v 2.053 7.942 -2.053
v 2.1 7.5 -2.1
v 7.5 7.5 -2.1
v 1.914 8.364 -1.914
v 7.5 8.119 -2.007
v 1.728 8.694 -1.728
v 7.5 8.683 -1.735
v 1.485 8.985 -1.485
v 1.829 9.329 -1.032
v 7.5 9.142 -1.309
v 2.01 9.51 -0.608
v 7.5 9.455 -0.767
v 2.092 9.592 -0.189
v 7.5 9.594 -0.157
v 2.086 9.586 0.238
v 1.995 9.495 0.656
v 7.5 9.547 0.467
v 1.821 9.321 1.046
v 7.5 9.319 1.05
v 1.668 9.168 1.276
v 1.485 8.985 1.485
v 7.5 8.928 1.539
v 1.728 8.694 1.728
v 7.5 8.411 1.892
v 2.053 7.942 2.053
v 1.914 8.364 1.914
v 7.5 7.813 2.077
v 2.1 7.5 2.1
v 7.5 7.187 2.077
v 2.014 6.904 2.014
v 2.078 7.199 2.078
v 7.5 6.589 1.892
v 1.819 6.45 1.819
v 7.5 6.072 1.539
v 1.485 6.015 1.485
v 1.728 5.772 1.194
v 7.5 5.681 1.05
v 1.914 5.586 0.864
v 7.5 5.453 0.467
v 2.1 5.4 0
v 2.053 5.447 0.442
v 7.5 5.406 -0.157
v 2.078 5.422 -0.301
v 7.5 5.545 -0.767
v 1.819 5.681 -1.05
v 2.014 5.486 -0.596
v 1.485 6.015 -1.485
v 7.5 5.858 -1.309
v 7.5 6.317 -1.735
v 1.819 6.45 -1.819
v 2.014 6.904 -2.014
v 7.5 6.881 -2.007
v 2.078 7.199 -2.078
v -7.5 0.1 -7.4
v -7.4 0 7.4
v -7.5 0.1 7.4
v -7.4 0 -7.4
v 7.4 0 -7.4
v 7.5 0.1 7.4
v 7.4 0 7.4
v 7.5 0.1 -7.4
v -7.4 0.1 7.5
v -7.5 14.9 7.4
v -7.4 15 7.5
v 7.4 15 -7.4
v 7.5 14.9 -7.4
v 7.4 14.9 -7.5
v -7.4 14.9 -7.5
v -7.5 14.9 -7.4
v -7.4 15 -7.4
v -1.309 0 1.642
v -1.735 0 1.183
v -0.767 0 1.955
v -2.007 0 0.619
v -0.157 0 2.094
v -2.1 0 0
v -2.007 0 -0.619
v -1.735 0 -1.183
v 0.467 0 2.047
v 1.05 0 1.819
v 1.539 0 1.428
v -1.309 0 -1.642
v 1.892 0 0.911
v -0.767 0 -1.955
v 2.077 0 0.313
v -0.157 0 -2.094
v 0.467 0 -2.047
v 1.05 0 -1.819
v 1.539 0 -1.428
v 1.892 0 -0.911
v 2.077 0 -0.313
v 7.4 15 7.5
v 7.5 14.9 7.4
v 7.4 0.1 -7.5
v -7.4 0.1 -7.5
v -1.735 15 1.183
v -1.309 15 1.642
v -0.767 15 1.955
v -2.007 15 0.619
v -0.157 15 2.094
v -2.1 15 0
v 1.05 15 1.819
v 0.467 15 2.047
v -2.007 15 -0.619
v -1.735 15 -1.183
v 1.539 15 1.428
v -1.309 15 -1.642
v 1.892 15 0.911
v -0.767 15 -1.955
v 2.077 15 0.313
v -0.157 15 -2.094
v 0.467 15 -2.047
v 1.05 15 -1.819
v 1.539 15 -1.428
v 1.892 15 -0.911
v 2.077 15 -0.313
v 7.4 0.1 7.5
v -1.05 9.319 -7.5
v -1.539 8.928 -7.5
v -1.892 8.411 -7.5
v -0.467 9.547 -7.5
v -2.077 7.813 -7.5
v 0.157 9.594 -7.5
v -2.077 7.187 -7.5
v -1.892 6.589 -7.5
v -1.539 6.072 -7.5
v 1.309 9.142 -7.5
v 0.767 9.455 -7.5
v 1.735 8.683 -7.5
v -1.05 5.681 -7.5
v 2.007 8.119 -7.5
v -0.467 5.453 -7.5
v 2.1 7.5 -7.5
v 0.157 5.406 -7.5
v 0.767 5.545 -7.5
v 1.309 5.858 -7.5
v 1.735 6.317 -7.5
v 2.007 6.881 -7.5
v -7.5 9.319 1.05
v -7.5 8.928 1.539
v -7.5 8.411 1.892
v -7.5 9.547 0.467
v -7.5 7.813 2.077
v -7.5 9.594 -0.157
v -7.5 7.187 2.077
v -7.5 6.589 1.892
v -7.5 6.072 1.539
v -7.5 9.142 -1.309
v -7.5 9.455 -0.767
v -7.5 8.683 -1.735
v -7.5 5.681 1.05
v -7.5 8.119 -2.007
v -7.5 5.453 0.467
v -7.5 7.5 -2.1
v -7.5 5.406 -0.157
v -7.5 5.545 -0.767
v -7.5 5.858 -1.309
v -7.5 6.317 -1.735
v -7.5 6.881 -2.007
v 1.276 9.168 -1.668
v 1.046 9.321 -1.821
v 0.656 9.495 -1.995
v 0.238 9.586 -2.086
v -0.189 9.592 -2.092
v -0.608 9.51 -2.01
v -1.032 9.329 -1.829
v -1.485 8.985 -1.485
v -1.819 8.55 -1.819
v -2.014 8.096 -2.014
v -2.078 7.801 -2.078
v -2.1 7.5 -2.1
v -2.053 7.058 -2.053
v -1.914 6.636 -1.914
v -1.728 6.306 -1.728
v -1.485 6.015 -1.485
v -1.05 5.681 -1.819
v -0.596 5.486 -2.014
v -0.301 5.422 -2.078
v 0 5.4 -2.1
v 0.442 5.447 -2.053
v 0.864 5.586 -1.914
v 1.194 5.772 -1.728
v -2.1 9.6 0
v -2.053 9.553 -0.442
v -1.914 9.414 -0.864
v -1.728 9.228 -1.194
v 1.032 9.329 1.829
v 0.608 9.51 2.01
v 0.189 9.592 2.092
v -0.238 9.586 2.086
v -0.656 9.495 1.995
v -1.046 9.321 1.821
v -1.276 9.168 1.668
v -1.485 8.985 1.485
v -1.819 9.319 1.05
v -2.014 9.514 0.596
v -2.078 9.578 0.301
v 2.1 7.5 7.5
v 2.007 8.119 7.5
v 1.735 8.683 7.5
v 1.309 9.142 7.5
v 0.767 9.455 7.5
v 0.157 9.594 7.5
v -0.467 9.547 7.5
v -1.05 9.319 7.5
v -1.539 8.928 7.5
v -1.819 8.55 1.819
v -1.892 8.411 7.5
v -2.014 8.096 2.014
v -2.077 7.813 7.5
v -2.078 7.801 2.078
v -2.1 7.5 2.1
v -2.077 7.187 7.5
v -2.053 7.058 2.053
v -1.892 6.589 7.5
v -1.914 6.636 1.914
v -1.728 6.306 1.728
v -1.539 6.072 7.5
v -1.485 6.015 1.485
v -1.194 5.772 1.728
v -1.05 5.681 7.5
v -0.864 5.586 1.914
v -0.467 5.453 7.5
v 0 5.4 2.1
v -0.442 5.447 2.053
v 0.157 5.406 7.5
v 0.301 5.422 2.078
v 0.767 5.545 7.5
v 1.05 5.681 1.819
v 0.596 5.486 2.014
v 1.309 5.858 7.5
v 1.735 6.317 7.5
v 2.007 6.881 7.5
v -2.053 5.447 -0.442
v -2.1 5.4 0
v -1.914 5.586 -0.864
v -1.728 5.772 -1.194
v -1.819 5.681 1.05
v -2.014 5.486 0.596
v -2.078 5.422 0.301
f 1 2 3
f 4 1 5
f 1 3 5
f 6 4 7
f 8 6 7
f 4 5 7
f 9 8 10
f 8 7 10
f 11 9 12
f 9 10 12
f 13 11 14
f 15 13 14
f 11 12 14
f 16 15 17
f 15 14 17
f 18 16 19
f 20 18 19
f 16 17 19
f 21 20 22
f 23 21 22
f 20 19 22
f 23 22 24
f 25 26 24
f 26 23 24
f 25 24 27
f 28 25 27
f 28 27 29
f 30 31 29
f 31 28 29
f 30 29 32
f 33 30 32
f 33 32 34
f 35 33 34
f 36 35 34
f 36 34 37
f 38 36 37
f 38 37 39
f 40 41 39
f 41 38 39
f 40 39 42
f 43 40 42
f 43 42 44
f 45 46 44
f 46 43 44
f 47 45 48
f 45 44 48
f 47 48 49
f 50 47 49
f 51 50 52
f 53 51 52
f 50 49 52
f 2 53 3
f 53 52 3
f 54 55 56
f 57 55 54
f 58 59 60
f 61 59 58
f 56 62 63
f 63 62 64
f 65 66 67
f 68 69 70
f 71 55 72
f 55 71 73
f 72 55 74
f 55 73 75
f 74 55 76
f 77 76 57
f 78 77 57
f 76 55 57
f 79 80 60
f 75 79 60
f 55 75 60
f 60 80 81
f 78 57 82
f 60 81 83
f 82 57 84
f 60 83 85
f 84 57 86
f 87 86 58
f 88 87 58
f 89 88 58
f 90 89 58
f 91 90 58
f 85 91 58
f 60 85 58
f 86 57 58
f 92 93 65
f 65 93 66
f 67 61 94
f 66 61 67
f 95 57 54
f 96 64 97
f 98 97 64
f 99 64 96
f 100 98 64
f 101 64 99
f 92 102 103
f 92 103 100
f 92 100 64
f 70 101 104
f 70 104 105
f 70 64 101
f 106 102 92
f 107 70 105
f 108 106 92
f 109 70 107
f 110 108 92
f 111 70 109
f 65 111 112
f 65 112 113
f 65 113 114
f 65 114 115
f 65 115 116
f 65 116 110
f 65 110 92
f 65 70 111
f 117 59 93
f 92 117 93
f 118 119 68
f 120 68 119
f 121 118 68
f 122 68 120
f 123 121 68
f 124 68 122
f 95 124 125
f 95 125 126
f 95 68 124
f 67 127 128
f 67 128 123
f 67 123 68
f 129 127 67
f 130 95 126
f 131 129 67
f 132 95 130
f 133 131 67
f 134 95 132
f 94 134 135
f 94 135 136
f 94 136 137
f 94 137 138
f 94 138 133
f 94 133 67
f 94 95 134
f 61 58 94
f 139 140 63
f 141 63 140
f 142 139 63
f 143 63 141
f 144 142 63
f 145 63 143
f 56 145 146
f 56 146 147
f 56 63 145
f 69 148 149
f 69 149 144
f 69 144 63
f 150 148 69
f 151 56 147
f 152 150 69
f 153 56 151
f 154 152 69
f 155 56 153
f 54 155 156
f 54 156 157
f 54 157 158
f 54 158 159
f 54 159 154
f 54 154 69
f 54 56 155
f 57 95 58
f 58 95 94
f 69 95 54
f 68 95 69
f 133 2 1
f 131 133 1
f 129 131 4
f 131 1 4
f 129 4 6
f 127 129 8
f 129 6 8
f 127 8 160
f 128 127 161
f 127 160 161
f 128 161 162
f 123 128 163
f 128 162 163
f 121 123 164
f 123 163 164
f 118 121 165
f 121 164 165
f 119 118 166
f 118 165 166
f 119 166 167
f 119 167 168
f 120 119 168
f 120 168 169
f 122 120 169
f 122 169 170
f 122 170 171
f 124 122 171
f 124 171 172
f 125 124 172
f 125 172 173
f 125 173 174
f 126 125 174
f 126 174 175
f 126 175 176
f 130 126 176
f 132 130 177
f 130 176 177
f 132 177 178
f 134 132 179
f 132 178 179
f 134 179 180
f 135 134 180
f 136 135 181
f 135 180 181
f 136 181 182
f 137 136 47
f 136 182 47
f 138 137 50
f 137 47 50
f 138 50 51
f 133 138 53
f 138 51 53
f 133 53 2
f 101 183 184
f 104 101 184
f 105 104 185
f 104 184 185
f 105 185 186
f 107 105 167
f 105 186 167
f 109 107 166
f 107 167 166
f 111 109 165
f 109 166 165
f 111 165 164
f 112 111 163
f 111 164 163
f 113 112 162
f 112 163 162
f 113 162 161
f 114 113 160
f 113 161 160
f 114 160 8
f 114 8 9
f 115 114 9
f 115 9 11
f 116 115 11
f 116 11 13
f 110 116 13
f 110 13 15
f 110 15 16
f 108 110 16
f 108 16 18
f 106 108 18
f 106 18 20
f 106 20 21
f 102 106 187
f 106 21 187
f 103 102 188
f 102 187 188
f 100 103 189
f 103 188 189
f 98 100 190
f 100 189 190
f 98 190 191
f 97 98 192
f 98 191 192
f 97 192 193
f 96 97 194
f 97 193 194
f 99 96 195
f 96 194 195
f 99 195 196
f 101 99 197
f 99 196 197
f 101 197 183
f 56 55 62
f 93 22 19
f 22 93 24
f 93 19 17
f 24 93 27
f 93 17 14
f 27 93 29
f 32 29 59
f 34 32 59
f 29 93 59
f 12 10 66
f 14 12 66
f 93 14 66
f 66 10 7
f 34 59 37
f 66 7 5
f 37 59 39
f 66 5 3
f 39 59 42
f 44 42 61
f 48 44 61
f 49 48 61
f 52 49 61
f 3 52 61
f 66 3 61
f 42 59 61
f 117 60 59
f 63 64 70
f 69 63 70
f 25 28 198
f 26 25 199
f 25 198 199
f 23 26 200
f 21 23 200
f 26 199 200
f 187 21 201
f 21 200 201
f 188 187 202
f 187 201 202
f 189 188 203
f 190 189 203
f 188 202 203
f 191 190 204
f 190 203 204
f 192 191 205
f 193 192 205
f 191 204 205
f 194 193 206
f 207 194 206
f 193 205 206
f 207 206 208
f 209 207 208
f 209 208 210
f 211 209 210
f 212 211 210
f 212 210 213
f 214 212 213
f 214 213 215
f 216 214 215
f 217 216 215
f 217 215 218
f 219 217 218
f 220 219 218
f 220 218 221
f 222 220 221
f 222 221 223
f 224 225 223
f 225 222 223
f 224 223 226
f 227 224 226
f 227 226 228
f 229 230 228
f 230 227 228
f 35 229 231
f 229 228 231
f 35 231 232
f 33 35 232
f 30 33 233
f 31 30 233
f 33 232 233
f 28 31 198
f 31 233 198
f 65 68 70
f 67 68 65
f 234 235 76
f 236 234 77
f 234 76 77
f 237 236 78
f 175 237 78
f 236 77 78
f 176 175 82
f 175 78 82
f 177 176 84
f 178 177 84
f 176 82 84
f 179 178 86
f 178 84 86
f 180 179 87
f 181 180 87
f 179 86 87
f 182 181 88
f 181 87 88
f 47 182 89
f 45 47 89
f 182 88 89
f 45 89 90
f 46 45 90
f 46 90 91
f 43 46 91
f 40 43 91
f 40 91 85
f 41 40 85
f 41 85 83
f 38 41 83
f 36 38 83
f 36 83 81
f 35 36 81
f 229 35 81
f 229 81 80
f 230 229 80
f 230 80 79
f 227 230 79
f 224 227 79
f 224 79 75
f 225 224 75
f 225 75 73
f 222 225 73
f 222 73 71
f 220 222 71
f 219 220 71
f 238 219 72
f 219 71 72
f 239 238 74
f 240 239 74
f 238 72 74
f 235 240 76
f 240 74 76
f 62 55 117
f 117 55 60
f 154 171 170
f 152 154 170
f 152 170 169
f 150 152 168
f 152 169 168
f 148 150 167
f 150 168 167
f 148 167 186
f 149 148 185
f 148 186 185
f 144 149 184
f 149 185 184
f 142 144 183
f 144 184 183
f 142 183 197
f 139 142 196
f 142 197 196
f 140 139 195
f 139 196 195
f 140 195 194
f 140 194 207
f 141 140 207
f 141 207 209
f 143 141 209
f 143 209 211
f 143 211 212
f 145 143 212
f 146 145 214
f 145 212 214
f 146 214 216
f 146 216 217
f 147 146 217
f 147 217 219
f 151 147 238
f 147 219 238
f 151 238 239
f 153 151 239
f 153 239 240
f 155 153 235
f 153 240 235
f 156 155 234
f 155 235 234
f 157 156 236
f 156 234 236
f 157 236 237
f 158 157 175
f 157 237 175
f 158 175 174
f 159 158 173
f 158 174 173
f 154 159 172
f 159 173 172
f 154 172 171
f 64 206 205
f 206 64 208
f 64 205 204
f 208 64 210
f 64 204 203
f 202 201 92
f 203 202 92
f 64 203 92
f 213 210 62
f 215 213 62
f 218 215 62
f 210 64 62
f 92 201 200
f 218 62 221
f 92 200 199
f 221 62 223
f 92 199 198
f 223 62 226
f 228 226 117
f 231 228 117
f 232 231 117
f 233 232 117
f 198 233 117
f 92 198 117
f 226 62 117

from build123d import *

# Parameters (mm, degrees)
SKETCH_1_W      = 15
SKETCH_1_H      = 15
EXTRUDE_1_DEPTH = 15
M5X0_8_1_D      = 4.2
M5X0_8_2_D      = 4.2
M5X0_8_3_D      = 4.2
CHAMFER_1_SIZE  = 0.1


with BuildPart() as part:
    # 草图1 → 凸台-拉伸1 (new body)
    with BuildSketch(Plane(origin=(0, 0, 0), x_dir=(1, 0, 0), z_dir=(0, 1, 0))):
        Rectangle(SKETCH_1_W, SKETCH_1_H)
    extrude(amount=EXTRUDE_1_DEPTH)

    # M5x0.8 螺纹孔1 (through all)
    with Locations(Plane(origin=(0, 15, 0), x_dir=(1, 0, 0), z_dir=(0, 1, 0))):
        with Locations((0, 0)):
            Hole(M5X0_8_1_D / 2)

    # M5x0.8 螺纹孔2 (through all)
    with Locations(Plane(origin=(0, 0, -7.5), x_dir=(-1, 0, 0), z_dir=(0, 0, -1))):
        with Locations((0, 7.5)):
            Hole(M5X0_8_2_D / 2)

    # M5x0.8 螺纹孔3 (through all)
    with Locations(Plane.ZY.offset(7.5)):
        with Locations((0, 7.5)):
            Hole(M5X0_8_3_D / 2)

    # 倒角1
    chamfer_1_edges = [part.edges().sort_by_distance(p)[0] for p in [
        (-7.5, 15, 0),
        (7.5, 15, 0),
        (0, 0, 7.5),
        (-7.5, 0, 0),
        (0, 0, -7.5),
        (7.5, 0, 0),
        (7.5, 7.5, 7.5),
        (-7.5, 7.5, 7.5),
        (-7.5, 7.5, -7.5),
        (7.5, 7.5, -7.5),
        (0, 15, -7.5),
    ]]
    chamfer(chamfer_1_edges, length=CHAMFER_1_SIZE)


solid = part.part
